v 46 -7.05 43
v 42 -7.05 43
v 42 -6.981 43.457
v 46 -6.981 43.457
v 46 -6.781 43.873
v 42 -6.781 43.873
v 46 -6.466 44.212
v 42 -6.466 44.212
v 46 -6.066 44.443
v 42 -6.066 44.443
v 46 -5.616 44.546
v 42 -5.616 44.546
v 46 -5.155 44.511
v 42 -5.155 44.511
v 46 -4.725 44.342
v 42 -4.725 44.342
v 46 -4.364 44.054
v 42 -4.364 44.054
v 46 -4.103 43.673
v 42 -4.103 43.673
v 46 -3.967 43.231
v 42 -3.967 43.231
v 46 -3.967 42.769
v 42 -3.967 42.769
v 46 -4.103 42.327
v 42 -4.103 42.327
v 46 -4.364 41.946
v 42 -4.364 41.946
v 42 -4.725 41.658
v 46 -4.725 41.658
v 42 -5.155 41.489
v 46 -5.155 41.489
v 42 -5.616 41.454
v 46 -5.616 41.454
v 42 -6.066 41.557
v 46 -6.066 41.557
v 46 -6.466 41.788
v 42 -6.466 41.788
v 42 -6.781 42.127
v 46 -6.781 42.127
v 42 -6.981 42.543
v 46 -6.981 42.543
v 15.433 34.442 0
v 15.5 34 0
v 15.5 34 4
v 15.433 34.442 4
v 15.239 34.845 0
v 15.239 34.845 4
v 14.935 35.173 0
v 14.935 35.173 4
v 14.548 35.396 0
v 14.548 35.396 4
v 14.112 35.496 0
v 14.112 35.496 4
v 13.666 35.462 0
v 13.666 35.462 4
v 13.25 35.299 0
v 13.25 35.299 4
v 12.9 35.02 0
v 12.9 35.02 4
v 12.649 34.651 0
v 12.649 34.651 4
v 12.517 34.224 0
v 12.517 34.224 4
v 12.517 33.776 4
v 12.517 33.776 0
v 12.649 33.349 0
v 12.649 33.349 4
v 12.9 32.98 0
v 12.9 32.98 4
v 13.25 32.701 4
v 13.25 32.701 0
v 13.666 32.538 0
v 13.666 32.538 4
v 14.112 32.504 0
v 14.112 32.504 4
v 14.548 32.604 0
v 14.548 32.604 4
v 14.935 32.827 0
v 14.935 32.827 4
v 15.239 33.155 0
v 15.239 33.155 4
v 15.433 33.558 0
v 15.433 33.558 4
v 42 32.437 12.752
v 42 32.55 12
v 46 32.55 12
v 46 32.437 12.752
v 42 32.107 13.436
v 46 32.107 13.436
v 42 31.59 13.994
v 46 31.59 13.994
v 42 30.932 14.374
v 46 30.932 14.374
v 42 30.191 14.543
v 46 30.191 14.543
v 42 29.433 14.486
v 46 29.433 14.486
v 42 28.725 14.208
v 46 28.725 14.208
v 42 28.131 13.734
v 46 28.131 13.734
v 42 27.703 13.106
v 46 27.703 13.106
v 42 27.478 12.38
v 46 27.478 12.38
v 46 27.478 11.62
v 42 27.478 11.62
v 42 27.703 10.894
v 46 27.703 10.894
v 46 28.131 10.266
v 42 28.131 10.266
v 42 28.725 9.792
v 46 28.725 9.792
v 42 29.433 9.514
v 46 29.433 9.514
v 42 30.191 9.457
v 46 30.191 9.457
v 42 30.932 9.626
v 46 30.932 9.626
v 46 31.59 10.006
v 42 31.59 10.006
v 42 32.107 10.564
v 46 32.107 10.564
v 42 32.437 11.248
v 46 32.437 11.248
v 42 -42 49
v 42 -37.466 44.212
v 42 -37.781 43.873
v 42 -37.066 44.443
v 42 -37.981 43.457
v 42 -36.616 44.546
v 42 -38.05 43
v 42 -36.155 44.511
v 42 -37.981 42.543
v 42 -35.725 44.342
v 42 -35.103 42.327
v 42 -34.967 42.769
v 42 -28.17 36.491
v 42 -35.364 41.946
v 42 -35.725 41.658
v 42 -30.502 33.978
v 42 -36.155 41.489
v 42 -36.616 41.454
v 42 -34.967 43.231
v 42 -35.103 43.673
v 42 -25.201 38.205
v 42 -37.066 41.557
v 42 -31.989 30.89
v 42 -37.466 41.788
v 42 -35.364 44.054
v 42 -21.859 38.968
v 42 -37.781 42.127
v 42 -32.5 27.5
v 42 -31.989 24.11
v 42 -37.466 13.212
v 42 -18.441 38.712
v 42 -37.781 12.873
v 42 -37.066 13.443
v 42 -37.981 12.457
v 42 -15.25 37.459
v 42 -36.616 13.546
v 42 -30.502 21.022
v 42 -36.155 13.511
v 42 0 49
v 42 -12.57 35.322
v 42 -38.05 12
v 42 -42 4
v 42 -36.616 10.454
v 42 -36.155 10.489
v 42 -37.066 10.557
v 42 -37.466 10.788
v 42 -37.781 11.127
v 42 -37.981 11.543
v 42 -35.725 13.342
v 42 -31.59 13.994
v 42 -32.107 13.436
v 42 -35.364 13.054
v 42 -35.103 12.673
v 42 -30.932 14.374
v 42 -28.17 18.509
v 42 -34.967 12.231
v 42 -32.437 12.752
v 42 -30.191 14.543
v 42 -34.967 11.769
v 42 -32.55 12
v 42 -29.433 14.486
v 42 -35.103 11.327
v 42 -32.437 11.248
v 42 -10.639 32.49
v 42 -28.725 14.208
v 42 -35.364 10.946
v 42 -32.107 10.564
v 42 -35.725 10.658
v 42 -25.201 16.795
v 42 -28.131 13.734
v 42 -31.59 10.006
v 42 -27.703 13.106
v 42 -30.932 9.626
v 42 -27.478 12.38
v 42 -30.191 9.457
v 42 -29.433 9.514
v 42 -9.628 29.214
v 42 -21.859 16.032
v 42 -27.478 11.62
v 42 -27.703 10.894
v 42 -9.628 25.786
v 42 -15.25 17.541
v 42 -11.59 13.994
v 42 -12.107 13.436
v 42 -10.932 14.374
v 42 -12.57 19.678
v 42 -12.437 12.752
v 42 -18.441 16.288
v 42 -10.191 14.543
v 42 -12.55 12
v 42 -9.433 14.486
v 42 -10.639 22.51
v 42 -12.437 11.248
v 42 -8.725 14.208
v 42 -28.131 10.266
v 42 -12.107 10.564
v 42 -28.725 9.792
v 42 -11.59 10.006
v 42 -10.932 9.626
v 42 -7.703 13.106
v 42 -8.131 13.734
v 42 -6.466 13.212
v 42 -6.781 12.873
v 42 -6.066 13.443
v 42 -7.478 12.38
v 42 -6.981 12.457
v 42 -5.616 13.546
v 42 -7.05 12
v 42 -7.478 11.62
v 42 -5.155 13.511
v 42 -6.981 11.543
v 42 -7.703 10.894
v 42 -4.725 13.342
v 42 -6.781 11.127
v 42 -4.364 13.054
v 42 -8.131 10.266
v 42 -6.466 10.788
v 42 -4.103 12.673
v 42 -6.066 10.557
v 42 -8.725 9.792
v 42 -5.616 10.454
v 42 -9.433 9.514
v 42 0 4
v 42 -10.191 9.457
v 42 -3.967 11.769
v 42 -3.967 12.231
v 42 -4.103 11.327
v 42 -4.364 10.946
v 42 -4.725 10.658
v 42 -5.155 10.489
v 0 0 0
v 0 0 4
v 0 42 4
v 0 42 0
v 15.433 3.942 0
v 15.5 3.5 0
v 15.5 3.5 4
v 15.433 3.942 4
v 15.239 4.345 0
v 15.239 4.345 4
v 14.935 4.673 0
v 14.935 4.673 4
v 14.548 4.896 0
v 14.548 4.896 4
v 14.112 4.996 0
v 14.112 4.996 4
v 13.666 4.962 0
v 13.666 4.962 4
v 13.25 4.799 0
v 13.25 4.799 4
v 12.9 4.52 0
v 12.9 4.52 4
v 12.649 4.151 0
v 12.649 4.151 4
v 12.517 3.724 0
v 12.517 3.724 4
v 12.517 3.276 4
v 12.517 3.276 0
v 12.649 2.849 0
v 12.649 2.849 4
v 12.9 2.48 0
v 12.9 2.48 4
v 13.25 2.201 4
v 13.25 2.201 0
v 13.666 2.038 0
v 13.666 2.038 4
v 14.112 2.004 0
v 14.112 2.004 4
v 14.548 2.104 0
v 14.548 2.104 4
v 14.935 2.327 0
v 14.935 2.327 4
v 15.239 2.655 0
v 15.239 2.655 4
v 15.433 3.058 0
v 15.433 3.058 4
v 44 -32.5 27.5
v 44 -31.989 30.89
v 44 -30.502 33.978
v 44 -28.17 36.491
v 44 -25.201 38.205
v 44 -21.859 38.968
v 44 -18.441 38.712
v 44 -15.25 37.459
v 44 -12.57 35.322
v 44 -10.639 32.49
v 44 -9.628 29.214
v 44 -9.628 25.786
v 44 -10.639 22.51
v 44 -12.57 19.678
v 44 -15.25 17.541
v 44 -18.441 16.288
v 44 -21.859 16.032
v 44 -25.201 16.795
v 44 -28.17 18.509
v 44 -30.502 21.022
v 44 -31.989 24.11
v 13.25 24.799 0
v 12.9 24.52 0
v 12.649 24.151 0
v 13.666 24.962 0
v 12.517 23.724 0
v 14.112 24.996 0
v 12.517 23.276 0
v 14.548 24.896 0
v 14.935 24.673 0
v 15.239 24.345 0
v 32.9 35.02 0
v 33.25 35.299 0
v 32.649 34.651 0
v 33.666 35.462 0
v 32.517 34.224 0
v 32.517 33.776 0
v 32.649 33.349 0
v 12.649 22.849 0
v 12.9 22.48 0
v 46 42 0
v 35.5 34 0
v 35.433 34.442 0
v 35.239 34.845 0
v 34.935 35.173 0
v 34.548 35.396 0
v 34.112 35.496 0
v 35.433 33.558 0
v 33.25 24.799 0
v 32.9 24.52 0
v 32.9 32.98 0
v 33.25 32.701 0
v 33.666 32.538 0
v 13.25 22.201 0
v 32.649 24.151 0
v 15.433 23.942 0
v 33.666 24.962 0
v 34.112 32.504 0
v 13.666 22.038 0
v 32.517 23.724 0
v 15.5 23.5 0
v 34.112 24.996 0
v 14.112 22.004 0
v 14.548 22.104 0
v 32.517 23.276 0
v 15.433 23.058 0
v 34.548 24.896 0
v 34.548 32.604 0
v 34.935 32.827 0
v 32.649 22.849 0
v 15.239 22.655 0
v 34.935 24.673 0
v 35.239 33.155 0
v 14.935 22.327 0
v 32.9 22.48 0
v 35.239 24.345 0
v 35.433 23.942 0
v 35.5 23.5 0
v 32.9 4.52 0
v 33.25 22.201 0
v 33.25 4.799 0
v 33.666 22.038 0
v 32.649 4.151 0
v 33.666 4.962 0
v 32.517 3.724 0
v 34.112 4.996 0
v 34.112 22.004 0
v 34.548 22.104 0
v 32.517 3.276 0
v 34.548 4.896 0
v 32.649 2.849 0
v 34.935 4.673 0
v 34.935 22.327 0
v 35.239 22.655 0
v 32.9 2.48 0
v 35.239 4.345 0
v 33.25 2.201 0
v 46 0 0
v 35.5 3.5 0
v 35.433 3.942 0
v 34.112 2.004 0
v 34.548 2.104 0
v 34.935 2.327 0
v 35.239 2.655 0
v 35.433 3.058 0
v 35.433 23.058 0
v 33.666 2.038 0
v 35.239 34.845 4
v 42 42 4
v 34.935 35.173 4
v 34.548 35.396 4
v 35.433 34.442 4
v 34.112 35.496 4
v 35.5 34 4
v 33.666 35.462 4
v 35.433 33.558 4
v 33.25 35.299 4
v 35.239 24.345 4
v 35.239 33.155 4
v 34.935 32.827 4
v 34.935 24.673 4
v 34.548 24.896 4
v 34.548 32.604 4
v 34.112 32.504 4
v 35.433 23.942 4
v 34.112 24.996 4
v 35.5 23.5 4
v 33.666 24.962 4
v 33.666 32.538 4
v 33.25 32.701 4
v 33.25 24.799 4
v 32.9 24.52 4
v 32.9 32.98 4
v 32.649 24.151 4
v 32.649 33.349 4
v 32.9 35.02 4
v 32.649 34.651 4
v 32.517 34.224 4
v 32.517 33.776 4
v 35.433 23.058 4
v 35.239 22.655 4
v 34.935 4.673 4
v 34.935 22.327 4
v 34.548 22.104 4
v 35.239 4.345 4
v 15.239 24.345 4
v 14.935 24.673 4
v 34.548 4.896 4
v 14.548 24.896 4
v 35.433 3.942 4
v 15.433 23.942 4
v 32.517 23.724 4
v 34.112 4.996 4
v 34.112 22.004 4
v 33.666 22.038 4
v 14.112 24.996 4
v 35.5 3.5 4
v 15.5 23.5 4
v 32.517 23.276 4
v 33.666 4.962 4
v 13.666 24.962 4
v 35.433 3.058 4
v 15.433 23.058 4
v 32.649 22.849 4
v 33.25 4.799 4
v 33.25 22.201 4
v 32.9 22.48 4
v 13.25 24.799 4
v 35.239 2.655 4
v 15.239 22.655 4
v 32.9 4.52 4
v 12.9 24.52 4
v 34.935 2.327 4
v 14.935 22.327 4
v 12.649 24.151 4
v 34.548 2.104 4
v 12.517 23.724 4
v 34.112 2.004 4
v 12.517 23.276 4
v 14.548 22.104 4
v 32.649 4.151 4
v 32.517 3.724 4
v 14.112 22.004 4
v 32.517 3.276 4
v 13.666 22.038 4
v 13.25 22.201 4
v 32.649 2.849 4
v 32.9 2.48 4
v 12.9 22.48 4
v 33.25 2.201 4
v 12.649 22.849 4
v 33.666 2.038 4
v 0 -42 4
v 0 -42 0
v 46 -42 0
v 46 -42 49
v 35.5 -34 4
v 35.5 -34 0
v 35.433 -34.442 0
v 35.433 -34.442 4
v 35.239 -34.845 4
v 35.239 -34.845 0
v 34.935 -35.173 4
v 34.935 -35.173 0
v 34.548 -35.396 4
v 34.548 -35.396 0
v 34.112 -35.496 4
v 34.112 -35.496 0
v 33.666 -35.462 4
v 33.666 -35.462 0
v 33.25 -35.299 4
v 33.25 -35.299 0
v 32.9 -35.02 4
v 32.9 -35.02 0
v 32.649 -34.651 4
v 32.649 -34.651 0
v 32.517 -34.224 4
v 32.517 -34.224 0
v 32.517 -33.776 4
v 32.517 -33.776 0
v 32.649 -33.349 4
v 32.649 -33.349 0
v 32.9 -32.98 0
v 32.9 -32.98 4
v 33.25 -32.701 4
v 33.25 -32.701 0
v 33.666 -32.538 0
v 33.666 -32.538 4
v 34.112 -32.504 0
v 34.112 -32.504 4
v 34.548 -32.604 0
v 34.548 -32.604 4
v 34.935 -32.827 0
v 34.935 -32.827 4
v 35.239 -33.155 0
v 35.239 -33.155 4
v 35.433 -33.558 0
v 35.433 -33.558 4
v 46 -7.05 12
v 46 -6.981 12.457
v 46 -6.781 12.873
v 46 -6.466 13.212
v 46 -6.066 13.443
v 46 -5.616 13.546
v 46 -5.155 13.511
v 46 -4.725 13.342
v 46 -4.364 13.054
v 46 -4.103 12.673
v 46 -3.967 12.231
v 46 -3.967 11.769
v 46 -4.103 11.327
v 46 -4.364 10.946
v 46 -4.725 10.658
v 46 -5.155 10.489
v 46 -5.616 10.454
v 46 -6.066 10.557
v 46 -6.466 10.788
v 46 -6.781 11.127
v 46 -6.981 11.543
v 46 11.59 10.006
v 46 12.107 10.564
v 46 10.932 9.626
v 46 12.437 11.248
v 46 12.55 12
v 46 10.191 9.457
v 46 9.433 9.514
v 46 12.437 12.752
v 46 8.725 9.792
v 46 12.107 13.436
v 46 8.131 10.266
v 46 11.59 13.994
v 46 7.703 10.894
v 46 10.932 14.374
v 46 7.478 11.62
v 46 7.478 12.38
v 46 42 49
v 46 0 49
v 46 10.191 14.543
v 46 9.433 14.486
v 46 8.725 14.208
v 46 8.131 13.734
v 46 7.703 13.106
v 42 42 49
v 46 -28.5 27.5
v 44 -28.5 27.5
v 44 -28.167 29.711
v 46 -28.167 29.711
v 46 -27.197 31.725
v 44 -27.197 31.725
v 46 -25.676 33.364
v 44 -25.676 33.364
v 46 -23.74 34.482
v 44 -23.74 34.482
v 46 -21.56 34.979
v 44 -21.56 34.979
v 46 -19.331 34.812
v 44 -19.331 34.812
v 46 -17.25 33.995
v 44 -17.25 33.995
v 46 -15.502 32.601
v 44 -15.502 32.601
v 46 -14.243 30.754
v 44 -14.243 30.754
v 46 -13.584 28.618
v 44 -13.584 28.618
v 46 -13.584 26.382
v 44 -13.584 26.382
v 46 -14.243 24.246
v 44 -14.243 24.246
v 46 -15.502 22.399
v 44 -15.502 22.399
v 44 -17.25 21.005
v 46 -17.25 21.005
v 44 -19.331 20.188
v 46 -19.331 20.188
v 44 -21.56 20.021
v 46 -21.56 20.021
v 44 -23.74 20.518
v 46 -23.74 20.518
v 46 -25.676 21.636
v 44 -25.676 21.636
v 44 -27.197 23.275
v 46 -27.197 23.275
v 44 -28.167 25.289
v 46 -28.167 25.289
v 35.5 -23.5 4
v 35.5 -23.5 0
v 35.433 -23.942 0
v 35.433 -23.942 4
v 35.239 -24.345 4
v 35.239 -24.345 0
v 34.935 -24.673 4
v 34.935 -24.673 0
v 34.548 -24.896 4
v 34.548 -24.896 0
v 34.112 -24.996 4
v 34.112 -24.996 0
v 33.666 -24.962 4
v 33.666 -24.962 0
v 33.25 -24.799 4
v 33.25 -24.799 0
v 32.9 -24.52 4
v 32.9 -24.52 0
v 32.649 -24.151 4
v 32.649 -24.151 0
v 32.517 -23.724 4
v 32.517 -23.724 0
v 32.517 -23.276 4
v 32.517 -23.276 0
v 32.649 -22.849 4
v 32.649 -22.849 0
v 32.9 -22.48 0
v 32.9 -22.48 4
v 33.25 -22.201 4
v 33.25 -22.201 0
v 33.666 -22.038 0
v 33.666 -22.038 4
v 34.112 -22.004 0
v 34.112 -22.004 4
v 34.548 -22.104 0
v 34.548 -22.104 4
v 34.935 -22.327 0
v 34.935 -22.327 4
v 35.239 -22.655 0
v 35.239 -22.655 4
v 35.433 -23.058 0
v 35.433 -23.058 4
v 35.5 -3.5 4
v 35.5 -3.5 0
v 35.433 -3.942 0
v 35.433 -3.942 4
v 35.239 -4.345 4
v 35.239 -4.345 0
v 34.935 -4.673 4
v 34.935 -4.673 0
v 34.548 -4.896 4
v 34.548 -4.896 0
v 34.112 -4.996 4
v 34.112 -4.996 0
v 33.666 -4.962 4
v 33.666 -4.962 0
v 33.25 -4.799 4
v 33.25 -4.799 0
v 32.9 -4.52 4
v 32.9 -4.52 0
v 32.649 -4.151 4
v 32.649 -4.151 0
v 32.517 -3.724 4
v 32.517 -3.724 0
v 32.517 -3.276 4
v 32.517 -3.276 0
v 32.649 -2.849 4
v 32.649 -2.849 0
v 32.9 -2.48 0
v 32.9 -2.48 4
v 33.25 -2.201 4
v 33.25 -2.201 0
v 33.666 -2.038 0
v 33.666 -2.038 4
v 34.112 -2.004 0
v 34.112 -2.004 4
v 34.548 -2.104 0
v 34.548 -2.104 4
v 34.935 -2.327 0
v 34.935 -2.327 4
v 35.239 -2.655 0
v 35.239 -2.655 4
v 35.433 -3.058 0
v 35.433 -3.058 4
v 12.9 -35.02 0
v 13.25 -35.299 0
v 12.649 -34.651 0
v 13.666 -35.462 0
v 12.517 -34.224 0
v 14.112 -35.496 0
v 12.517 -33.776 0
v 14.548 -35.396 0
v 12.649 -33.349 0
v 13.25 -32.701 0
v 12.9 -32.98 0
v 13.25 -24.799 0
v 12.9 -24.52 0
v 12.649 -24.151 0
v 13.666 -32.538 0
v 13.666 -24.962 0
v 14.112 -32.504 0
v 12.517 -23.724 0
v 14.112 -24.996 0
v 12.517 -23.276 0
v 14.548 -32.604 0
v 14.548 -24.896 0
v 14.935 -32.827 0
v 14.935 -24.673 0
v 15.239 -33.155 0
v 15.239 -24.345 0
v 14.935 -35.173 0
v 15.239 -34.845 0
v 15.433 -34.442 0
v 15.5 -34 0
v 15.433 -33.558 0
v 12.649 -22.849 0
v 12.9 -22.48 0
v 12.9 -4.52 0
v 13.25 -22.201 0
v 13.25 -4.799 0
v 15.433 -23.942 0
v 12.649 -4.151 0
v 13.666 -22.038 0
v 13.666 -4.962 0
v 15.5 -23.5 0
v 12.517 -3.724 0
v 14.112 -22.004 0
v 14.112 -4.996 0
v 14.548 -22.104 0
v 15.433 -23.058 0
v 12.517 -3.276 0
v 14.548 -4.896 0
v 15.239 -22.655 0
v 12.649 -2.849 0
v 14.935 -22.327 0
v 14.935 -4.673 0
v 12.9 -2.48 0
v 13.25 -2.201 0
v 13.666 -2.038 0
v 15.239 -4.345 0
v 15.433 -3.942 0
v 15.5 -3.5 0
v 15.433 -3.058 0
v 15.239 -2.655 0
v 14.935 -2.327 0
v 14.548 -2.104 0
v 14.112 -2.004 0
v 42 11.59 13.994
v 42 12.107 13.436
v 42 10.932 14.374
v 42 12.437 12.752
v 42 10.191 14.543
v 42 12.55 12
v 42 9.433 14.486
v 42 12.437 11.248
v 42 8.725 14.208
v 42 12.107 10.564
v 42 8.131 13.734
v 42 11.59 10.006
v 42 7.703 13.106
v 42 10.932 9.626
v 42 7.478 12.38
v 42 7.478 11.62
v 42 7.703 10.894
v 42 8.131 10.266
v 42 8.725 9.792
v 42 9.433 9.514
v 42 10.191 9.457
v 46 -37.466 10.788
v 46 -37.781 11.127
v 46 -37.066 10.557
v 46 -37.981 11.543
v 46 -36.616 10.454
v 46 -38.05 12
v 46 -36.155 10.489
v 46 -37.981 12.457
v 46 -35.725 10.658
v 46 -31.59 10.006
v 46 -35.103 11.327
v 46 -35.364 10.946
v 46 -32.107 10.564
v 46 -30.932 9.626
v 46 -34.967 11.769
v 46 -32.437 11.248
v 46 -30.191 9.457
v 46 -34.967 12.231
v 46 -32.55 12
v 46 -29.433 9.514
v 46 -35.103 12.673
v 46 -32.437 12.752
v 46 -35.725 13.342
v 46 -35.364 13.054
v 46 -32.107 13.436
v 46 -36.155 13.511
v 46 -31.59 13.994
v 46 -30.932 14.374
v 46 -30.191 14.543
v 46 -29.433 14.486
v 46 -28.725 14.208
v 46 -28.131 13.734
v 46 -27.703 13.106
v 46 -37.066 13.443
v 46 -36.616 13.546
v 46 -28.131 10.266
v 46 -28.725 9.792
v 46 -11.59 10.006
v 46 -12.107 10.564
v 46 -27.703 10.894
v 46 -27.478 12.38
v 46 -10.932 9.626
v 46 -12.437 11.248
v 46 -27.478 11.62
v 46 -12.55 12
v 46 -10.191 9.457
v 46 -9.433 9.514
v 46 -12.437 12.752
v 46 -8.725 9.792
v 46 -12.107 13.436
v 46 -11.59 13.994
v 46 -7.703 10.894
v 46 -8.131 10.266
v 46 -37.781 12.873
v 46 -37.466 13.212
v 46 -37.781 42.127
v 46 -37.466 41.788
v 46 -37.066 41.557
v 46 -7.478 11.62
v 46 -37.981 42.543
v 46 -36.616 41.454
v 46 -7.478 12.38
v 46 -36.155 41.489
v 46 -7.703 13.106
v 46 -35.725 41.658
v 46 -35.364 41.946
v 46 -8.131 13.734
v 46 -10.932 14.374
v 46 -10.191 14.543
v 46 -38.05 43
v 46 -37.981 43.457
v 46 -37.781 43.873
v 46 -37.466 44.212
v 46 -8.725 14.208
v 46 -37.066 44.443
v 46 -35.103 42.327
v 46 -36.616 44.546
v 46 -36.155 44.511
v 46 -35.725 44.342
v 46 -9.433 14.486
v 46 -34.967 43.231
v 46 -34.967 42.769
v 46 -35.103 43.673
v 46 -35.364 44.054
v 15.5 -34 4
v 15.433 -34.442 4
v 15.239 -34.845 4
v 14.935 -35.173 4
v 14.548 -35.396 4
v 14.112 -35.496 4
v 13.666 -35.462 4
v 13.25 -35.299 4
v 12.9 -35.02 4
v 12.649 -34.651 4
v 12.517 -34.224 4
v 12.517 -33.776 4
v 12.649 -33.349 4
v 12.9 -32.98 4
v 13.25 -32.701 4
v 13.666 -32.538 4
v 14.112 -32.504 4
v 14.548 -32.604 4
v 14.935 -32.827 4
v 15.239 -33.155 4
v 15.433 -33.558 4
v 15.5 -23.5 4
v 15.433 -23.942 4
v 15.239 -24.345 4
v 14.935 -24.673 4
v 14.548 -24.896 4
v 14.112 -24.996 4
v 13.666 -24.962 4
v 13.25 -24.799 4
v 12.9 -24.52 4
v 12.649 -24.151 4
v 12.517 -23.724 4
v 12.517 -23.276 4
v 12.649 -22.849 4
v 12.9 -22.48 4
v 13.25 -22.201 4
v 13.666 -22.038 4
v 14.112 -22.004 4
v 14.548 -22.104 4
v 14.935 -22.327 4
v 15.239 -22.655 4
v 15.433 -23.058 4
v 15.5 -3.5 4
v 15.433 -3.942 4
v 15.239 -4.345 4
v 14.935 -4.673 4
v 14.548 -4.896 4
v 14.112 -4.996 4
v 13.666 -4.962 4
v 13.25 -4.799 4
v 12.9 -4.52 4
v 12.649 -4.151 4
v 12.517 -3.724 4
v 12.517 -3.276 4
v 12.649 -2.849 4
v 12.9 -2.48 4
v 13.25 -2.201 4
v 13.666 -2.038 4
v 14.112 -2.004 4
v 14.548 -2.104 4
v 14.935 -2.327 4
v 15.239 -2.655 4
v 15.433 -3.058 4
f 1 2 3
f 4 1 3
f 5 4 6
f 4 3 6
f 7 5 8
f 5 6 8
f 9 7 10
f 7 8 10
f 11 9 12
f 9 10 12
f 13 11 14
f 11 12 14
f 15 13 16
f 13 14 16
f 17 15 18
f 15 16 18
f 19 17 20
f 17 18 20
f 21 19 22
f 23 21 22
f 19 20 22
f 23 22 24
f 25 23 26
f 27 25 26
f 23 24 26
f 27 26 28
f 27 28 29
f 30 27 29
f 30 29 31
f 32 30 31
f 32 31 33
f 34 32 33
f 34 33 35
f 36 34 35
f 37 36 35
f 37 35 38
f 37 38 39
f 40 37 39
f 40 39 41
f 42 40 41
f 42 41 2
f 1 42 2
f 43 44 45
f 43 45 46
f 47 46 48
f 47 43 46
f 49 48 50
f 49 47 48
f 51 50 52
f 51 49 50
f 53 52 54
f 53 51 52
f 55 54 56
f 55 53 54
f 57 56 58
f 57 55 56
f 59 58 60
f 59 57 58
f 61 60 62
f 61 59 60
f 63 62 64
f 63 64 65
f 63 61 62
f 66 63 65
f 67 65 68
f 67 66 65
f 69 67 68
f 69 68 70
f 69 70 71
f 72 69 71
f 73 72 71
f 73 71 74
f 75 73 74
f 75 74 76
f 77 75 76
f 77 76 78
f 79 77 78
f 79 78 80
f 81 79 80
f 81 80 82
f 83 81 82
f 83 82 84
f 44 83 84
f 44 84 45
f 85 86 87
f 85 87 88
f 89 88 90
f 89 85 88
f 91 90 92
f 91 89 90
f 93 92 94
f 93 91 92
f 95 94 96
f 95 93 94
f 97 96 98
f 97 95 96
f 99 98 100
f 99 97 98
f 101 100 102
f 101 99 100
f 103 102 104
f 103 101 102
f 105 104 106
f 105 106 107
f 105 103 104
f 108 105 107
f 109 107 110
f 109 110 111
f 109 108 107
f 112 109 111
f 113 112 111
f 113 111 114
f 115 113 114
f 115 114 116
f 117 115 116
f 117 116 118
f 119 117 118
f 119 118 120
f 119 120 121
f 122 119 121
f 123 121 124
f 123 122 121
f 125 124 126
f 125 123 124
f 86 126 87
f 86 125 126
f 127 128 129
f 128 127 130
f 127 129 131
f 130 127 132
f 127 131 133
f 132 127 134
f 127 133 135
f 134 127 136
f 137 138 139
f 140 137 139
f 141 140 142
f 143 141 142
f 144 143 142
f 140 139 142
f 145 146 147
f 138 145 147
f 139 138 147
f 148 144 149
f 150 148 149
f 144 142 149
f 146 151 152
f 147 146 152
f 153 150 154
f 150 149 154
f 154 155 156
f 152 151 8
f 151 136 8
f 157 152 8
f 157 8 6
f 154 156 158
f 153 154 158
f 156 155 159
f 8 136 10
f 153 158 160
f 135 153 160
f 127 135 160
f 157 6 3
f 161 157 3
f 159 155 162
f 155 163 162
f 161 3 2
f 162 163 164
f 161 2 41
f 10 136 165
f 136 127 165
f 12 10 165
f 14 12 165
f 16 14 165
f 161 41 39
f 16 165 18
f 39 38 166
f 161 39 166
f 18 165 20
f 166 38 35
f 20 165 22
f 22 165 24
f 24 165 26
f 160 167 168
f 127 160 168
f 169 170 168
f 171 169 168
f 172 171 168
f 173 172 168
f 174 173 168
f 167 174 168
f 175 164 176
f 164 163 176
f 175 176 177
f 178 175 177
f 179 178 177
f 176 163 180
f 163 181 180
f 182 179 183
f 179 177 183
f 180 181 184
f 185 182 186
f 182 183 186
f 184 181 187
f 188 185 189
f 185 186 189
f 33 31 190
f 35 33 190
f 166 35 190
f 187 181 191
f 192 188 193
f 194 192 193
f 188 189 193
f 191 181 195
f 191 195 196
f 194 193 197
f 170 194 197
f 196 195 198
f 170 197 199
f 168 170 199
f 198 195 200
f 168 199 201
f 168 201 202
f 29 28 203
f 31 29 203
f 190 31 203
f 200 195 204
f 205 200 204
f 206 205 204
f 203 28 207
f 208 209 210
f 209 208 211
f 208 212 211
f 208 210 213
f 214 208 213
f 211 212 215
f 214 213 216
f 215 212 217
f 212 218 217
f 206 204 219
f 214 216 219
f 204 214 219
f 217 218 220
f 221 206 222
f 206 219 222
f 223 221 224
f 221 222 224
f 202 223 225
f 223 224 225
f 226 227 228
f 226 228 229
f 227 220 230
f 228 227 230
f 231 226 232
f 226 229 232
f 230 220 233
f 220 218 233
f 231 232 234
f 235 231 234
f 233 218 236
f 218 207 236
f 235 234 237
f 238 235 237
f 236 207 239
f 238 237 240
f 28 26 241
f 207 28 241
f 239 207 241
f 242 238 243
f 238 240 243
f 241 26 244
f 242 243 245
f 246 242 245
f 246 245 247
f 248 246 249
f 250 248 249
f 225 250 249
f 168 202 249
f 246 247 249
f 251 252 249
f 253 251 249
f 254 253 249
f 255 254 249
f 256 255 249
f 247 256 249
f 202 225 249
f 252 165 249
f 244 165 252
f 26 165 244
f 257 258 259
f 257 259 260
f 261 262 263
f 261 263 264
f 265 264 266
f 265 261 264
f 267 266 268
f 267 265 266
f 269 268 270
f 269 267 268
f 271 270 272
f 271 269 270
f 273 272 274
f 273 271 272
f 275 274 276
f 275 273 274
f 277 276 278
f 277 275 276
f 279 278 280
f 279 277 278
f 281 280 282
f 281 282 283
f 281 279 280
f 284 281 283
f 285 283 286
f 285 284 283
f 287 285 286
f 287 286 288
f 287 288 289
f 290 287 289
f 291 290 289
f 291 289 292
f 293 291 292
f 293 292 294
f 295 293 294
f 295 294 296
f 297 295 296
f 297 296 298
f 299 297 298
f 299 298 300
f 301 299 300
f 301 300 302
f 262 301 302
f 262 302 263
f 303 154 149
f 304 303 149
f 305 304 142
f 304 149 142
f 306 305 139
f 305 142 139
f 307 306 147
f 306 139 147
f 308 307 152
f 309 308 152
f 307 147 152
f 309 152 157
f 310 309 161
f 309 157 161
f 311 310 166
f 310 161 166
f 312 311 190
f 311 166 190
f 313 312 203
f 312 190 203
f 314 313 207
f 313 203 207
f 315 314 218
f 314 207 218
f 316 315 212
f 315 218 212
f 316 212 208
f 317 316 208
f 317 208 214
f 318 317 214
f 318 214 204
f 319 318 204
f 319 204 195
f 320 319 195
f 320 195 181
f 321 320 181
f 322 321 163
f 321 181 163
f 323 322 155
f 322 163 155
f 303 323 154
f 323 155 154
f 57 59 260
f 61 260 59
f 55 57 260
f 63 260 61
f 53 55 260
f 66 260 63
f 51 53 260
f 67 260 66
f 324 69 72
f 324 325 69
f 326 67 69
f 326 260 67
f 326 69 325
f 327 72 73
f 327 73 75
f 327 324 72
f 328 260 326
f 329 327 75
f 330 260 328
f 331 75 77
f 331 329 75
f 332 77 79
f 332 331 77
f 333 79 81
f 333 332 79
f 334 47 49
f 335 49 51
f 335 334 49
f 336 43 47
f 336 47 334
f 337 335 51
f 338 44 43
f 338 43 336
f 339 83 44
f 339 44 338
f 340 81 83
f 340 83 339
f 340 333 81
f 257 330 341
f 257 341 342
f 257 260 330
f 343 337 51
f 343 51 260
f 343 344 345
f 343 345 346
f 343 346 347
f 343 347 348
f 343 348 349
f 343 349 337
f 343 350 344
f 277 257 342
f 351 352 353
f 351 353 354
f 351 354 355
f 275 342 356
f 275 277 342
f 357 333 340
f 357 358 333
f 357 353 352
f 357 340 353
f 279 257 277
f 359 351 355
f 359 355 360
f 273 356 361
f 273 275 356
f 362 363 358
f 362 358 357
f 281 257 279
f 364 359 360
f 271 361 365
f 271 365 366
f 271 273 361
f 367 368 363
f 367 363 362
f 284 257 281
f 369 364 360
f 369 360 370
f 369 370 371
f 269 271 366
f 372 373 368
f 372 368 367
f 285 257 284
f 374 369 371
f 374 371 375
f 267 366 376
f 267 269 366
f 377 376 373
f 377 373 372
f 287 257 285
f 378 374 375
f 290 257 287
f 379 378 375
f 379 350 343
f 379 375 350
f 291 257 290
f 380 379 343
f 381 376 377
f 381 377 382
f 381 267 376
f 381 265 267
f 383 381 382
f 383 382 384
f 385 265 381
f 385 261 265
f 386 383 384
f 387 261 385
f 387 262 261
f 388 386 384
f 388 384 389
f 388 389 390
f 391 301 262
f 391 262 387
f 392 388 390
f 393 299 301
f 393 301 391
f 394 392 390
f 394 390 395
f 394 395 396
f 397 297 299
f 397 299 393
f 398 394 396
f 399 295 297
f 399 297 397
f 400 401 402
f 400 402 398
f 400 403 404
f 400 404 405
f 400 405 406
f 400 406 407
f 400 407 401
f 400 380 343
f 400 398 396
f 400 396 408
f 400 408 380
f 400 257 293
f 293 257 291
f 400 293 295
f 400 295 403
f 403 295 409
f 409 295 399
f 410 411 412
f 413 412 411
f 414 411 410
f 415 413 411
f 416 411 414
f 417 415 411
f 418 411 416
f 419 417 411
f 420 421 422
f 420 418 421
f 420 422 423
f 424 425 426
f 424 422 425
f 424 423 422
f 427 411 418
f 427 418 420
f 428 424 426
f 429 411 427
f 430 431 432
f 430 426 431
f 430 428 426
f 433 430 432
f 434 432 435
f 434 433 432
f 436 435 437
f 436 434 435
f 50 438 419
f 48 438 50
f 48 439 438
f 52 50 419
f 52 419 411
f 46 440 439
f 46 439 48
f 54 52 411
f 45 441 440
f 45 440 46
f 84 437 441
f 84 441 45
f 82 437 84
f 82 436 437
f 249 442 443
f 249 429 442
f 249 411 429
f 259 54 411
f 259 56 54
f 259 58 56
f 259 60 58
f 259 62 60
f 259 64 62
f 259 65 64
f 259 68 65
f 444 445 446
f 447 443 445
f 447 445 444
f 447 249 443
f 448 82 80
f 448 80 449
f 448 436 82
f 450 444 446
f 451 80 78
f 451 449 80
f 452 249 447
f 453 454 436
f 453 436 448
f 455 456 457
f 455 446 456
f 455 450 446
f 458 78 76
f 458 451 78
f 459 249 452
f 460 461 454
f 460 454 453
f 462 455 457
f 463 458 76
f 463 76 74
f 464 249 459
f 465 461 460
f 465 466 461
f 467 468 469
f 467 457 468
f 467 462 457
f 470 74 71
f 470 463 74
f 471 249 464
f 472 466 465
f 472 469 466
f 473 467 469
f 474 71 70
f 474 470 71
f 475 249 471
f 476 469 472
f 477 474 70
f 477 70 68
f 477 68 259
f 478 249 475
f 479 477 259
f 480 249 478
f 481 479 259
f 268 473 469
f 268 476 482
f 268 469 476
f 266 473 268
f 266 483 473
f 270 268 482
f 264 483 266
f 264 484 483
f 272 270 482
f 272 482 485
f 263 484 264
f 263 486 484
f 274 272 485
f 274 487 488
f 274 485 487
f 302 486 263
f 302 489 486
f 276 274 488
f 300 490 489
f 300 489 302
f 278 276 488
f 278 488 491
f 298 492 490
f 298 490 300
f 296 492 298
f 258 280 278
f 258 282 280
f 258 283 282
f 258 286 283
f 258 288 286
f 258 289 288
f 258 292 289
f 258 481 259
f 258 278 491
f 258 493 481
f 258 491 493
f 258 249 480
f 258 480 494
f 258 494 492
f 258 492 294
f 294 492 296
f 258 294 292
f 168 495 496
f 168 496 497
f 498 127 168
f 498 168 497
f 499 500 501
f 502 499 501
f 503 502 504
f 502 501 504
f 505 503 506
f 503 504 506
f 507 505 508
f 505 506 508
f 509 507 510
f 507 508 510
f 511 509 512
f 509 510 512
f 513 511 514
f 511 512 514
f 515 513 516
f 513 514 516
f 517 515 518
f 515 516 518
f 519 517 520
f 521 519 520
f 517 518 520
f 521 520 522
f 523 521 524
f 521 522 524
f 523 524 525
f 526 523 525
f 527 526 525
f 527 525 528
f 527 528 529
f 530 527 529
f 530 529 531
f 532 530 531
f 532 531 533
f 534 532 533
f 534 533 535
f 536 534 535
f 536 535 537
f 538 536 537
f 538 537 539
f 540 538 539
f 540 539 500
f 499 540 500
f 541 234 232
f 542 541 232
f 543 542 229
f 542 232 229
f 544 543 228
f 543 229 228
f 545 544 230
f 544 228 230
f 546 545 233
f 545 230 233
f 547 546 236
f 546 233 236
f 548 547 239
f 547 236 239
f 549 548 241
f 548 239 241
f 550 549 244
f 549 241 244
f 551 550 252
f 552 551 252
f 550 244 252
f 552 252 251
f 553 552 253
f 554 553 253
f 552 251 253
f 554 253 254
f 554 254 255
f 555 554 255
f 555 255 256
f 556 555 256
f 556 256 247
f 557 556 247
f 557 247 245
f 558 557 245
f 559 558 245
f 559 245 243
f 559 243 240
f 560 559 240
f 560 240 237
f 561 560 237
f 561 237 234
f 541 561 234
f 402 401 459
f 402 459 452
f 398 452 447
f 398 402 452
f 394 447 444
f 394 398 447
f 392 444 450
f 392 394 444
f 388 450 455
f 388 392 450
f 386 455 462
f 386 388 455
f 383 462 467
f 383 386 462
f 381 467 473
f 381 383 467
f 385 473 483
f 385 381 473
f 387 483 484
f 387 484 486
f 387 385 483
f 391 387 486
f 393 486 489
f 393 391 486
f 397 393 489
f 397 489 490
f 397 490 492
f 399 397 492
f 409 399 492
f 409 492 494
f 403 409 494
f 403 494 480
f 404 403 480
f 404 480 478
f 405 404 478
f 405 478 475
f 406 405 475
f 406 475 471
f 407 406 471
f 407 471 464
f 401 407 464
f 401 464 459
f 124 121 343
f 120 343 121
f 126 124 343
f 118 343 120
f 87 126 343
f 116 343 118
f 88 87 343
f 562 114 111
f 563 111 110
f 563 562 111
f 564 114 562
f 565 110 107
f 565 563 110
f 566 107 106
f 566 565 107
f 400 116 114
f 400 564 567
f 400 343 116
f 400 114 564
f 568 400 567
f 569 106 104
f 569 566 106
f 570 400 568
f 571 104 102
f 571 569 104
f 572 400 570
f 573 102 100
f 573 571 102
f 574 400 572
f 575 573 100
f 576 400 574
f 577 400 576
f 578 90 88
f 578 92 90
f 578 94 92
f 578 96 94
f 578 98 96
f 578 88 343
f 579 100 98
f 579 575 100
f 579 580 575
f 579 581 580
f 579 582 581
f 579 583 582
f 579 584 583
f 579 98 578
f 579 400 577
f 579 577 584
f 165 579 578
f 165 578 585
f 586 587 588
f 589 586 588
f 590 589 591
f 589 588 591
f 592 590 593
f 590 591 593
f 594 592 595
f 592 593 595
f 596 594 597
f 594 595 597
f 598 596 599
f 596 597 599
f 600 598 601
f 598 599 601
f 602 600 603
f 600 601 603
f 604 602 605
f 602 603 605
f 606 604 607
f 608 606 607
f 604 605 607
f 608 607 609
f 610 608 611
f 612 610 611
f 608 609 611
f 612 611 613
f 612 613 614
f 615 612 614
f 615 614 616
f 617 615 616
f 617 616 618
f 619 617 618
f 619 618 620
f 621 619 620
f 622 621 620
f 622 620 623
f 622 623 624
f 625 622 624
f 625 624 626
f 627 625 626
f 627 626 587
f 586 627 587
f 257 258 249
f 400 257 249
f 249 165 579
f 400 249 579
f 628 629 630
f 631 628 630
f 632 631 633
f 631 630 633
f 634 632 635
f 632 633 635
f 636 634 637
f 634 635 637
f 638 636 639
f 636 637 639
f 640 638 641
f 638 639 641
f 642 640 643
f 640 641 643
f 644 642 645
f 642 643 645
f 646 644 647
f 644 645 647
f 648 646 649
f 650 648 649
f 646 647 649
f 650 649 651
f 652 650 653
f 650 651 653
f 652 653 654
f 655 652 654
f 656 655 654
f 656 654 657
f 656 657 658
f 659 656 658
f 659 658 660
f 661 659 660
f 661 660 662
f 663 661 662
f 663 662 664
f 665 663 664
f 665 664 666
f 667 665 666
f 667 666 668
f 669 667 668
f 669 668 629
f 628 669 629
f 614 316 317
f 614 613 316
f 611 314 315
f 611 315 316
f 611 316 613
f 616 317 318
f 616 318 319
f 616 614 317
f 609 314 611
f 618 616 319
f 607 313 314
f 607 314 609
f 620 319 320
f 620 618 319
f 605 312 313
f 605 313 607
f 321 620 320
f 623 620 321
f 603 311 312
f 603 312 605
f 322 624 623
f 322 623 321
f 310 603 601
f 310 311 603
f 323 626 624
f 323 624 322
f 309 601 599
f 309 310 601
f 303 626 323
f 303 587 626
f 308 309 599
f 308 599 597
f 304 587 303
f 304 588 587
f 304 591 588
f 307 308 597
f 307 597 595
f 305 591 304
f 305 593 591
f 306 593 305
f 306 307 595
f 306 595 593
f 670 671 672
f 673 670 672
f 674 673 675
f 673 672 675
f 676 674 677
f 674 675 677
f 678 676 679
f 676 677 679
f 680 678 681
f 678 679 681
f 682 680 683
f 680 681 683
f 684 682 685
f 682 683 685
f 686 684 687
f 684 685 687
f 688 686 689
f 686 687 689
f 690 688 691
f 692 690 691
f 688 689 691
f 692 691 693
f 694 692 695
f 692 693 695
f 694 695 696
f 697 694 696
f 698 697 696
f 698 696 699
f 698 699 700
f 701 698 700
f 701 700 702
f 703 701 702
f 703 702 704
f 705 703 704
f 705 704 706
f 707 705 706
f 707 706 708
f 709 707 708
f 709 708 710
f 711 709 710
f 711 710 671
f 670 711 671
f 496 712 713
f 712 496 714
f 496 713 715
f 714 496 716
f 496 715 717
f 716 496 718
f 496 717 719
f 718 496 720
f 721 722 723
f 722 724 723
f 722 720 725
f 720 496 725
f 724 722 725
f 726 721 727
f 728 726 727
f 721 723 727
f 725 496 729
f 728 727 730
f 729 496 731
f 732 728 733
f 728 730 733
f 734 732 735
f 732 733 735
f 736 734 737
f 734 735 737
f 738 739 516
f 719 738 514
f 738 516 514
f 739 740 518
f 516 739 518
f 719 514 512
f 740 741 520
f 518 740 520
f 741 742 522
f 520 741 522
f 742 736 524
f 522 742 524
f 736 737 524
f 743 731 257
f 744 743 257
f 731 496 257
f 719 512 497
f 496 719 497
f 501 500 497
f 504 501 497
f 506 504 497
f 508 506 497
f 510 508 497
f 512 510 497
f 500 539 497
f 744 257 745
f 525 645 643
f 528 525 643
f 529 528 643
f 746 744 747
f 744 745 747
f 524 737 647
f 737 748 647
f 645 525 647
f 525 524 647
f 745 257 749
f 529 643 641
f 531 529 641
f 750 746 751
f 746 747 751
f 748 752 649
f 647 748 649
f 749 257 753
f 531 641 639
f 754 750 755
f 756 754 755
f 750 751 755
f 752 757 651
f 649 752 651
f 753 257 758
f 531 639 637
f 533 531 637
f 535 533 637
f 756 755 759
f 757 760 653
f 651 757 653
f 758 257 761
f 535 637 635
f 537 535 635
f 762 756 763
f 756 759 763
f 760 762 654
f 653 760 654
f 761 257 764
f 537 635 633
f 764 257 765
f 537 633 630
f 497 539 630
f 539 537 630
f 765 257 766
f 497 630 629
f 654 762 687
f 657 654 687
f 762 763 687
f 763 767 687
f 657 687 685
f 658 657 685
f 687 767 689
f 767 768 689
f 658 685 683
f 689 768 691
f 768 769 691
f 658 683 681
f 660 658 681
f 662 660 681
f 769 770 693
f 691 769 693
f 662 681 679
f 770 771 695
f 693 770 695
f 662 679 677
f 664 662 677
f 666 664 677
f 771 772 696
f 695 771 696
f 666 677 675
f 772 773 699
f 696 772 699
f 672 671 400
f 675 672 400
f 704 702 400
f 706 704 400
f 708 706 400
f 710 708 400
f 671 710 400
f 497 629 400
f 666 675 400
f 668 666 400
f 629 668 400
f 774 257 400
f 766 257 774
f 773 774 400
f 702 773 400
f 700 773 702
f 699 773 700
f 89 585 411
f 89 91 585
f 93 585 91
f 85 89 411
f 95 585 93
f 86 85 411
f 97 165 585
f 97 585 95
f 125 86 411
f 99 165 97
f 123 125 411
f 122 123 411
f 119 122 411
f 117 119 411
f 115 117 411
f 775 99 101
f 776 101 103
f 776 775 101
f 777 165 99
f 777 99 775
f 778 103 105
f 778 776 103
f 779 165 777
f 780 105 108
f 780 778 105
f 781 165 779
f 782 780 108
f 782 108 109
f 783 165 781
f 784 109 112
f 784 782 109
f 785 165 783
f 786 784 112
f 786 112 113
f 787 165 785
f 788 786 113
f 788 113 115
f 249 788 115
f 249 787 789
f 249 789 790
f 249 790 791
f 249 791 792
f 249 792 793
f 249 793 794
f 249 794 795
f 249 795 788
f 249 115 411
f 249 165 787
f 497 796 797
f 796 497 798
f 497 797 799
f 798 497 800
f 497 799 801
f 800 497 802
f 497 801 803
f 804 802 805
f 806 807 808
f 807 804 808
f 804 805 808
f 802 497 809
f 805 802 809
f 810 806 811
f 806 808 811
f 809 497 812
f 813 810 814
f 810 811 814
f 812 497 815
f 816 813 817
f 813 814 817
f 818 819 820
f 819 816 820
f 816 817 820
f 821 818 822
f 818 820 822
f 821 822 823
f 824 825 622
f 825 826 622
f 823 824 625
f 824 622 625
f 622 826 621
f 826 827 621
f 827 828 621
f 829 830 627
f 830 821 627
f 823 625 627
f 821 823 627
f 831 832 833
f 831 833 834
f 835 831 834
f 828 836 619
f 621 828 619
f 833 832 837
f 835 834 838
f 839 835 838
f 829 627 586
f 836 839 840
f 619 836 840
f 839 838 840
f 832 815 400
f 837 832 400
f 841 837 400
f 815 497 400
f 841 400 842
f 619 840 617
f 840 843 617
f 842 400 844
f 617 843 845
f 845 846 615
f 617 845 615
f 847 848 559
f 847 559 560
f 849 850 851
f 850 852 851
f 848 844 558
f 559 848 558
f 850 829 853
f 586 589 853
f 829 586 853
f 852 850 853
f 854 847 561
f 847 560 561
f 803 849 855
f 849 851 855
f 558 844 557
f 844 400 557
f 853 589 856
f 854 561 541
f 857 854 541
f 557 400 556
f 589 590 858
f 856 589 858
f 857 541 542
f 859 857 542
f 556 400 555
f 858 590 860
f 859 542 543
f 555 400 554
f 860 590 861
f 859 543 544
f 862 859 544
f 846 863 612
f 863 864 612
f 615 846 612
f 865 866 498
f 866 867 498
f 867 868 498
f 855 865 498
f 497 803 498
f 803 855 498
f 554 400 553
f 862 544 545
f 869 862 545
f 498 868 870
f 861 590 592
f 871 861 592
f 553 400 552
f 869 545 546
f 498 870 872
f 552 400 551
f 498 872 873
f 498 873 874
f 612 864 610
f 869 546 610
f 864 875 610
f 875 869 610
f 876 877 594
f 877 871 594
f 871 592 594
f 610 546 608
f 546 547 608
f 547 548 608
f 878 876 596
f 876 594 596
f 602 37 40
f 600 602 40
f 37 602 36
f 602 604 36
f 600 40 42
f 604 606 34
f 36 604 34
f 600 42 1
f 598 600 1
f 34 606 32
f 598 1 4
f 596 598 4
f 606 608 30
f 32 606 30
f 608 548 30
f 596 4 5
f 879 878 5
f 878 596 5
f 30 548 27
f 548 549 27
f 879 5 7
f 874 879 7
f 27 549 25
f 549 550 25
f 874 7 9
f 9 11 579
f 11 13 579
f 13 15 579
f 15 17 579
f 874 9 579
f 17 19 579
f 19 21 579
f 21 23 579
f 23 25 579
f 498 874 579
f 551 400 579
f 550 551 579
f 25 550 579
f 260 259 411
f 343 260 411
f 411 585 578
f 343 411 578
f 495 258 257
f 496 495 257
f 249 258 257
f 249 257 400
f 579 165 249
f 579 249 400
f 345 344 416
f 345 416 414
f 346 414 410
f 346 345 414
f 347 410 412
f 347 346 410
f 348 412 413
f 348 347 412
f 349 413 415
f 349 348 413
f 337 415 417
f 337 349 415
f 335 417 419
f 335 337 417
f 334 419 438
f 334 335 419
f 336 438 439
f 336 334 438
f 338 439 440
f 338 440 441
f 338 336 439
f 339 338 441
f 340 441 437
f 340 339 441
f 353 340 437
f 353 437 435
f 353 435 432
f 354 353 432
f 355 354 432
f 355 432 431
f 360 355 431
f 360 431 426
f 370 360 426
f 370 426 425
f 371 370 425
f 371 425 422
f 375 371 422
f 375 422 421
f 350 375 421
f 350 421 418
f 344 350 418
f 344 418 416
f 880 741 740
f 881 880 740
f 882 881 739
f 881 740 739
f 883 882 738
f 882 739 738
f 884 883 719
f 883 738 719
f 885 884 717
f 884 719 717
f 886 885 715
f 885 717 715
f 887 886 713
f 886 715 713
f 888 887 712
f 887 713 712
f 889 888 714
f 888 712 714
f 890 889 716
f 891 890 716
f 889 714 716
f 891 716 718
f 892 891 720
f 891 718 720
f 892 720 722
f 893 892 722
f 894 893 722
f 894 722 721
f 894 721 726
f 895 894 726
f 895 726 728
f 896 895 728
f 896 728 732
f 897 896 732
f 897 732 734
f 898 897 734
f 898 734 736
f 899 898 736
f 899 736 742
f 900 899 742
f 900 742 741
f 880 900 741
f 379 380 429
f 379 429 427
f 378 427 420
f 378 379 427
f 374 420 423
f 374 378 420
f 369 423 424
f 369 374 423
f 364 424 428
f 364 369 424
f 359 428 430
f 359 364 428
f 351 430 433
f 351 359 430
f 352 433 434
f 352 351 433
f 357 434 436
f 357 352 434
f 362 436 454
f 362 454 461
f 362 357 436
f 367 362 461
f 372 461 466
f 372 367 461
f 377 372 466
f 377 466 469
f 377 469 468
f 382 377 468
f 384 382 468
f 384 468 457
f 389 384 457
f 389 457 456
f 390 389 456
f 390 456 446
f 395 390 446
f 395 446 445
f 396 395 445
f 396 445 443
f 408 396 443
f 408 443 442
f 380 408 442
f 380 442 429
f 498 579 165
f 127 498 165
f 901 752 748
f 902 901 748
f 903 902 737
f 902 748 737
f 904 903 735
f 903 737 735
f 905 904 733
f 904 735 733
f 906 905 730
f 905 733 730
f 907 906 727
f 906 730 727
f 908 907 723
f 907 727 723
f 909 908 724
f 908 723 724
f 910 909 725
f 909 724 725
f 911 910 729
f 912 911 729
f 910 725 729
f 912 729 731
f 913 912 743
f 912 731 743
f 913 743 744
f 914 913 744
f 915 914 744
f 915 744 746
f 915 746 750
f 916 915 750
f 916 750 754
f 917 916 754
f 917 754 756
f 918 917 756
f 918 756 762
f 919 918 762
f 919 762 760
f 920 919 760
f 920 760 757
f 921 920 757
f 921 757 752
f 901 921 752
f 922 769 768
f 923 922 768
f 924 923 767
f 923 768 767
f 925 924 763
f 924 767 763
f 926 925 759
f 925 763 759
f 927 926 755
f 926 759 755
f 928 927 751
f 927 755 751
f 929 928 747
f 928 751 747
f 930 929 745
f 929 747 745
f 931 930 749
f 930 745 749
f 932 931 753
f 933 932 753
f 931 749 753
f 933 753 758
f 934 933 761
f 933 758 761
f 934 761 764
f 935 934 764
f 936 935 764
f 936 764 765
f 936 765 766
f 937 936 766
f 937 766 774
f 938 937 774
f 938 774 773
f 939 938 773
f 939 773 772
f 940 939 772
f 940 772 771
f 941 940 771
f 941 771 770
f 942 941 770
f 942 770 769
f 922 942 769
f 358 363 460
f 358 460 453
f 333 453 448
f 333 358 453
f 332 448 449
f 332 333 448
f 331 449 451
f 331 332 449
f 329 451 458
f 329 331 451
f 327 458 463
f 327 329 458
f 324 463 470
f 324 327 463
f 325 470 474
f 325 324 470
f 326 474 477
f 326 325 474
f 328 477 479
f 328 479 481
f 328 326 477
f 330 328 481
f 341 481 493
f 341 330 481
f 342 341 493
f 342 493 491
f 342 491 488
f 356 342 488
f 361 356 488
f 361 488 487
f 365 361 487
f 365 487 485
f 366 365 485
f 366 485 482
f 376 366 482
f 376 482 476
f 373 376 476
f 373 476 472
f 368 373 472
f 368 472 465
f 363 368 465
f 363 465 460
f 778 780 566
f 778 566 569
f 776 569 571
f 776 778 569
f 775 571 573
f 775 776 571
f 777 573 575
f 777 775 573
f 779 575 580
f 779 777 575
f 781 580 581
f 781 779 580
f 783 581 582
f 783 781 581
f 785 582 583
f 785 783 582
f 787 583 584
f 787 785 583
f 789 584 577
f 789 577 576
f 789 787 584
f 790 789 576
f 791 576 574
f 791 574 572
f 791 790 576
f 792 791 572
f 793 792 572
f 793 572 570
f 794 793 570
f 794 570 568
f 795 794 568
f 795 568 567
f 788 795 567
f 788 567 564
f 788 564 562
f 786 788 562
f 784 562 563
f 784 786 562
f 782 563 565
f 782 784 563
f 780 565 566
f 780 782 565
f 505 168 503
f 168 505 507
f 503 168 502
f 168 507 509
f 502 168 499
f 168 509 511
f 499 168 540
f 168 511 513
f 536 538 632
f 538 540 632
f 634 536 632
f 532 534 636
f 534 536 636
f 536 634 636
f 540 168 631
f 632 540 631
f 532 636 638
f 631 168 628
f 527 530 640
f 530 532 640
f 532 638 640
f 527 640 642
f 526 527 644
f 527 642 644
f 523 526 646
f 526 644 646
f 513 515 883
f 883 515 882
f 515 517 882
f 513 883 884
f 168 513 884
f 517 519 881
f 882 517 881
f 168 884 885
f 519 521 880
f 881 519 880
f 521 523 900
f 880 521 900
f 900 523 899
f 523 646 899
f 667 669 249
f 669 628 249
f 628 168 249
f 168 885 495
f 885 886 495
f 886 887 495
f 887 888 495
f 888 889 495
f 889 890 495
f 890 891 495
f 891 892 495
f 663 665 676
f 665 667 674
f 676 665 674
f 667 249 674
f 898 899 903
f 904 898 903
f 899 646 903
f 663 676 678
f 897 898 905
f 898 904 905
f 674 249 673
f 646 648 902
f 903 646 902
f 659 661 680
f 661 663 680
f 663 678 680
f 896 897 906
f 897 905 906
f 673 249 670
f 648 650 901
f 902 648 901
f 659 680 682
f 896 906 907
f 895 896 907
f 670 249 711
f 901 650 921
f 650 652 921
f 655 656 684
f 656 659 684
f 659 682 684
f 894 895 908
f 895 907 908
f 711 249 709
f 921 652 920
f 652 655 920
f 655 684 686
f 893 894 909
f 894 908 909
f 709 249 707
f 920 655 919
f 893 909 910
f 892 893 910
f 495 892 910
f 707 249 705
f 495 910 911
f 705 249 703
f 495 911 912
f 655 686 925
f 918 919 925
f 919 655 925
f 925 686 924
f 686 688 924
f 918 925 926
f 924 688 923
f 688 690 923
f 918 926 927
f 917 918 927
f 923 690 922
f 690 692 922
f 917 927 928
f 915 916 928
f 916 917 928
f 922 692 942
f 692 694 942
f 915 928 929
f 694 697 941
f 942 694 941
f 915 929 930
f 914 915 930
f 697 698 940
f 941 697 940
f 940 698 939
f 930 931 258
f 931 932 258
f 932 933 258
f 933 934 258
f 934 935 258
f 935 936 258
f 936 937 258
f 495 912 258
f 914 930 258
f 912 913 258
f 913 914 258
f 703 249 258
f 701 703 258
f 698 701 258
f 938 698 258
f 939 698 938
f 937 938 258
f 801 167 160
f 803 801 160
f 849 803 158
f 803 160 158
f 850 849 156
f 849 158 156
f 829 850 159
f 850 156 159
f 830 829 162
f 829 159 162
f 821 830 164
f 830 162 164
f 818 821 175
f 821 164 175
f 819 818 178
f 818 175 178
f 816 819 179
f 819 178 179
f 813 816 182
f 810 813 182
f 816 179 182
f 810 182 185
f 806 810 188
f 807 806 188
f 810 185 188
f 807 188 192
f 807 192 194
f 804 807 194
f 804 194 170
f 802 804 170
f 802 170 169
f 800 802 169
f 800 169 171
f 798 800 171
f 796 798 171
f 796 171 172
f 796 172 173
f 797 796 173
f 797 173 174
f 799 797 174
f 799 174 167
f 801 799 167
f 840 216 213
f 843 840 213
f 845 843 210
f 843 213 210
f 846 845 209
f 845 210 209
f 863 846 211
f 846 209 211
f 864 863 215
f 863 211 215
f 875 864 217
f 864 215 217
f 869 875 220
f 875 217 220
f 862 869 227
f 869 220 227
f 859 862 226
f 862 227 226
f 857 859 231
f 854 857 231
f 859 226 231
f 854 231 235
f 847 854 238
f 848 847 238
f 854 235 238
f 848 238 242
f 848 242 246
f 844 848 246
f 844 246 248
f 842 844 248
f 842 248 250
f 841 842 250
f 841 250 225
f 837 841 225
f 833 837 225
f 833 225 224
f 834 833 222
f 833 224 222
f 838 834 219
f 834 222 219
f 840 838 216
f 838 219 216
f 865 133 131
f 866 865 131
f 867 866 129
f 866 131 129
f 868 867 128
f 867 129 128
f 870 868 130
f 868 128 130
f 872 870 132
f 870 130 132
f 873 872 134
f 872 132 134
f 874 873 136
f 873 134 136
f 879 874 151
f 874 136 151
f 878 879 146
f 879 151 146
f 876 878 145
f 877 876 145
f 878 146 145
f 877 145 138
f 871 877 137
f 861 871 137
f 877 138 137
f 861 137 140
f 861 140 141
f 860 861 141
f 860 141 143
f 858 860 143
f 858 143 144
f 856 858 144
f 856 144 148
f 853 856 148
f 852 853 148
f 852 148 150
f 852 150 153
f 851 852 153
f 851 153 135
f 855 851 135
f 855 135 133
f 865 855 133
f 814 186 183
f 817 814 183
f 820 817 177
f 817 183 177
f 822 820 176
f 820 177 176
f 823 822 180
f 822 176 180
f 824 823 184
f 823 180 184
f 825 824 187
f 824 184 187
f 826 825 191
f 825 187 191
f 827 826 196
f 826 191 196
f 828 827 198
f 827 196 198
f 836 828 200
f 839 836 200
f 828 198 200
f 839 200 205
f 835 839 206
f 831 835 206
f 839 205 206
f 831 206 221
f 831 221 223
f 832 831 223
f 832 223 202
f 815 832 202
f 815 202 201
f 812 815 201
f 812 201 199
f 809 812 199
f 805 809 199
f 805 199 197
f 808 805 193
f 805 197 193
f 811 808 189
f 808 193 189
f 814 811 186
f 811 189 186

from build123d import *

# Parameters (mm, degrees)
F1_DEPTH  = 42
F2_R      = 1.5
F3_DEPTH  = 25
F4_R      = 2.55
F5_DEPTH  = 4
F7_R      = 1.55
F7_R_2    = 7.5
F8_DEPTH  = 4.001
F9_R      = 11.5
F9_R_2    = 7.5
F10_DEPTH = 2


with BuildPart() as f1:
    # F0 (on Front) → F1 (new body)
    with BuildSketch(Plane.XZ):
        Polygon((0, 4), (0, 0), (46, 0), (46, 25), (46, 49), (42, 49), (42, 23), (42, 4), align=None)
    extrude(amount=F1_DEPTH)

    # F2 (on face) → F3 (cut)
    with BuildSketch(Plane(origin=(0, 0, 0), x_dir=(1, 0, 0), z_dir=(0, 0, -1))):
        with Locations((14, 3.5)):
            Circle(F2_R)
        with Locations((34, 3.5)):
            Circle(F2_R)
        with Locations((14, 23.5)):
            Circle(F2_R)
        with Locations((34, 23.5)):
            Circle(F2_R)
        with Locations((34, 34)):
            Circle(F2_R)
        with Locations((14, 34)):
            Circle(F2_R)
    extrude(amount=-F3_DEPTH, mode=Mode.SUBTRACT)

    # F4 (on face) → F5 (cut, through all)
    with BuildSketch(Plane(origin=(42, 0, 0), x_dir=(0, -1, 0), z_dir=(-1, 0, 0))):
        with Locations((10, 12)):
            Circle(F4_R)
        with Locations((30, 12)):
            Circle(F4_R)
    extrude(amount=-F5_DEPTH, mode=Mode.SUBTRACT)


with BuildPart() as f6_1:
    # F6: instance of F1
    add(f1.part.mirror(Plane.XZ))


with BuildPart() as f1_1:
    add(f1.part)

    # F7 (on face) → F8 (cut, through all)
    with BuildSketch(Plane(origin=(42, 0, 0), x_dir=(0, -1, 0), z_dir=(-1, 0, 0))):
        with Locations((5.5, 43)):
            Circle(F7_R)
        with Locations((36.5, 43)):
            Circle(F7_R)
        with Locations((5.5, 12)):
            Circle(F7_R)
        with Locations((36.5, 12)):
            Circle(F7_R)
        with Locations((21, 27.5)):
            Circle(F7_R_2)
    extrude(amount=-F8_DEPTH, mode=Mode.SUBTRACT)

    # F9 (on face) → F10 (cut)
    with BuildSketch(Plane(origin=(42, 0, 0), x_dir=(0, -1, 0), z_dir=(-1, 0, 0))):
        with Locations((21, 27.5)):
            Circle(F9_R)
        with Locations((21, 27.5)):
            Circle(F9_R_2, mode=Mode.SUBTRACT)
    extrude(amount=-F10_DEPTH, mode=Mode.SUBTRACT)


solid = Compound([f6_1.part, f1_1.part])
